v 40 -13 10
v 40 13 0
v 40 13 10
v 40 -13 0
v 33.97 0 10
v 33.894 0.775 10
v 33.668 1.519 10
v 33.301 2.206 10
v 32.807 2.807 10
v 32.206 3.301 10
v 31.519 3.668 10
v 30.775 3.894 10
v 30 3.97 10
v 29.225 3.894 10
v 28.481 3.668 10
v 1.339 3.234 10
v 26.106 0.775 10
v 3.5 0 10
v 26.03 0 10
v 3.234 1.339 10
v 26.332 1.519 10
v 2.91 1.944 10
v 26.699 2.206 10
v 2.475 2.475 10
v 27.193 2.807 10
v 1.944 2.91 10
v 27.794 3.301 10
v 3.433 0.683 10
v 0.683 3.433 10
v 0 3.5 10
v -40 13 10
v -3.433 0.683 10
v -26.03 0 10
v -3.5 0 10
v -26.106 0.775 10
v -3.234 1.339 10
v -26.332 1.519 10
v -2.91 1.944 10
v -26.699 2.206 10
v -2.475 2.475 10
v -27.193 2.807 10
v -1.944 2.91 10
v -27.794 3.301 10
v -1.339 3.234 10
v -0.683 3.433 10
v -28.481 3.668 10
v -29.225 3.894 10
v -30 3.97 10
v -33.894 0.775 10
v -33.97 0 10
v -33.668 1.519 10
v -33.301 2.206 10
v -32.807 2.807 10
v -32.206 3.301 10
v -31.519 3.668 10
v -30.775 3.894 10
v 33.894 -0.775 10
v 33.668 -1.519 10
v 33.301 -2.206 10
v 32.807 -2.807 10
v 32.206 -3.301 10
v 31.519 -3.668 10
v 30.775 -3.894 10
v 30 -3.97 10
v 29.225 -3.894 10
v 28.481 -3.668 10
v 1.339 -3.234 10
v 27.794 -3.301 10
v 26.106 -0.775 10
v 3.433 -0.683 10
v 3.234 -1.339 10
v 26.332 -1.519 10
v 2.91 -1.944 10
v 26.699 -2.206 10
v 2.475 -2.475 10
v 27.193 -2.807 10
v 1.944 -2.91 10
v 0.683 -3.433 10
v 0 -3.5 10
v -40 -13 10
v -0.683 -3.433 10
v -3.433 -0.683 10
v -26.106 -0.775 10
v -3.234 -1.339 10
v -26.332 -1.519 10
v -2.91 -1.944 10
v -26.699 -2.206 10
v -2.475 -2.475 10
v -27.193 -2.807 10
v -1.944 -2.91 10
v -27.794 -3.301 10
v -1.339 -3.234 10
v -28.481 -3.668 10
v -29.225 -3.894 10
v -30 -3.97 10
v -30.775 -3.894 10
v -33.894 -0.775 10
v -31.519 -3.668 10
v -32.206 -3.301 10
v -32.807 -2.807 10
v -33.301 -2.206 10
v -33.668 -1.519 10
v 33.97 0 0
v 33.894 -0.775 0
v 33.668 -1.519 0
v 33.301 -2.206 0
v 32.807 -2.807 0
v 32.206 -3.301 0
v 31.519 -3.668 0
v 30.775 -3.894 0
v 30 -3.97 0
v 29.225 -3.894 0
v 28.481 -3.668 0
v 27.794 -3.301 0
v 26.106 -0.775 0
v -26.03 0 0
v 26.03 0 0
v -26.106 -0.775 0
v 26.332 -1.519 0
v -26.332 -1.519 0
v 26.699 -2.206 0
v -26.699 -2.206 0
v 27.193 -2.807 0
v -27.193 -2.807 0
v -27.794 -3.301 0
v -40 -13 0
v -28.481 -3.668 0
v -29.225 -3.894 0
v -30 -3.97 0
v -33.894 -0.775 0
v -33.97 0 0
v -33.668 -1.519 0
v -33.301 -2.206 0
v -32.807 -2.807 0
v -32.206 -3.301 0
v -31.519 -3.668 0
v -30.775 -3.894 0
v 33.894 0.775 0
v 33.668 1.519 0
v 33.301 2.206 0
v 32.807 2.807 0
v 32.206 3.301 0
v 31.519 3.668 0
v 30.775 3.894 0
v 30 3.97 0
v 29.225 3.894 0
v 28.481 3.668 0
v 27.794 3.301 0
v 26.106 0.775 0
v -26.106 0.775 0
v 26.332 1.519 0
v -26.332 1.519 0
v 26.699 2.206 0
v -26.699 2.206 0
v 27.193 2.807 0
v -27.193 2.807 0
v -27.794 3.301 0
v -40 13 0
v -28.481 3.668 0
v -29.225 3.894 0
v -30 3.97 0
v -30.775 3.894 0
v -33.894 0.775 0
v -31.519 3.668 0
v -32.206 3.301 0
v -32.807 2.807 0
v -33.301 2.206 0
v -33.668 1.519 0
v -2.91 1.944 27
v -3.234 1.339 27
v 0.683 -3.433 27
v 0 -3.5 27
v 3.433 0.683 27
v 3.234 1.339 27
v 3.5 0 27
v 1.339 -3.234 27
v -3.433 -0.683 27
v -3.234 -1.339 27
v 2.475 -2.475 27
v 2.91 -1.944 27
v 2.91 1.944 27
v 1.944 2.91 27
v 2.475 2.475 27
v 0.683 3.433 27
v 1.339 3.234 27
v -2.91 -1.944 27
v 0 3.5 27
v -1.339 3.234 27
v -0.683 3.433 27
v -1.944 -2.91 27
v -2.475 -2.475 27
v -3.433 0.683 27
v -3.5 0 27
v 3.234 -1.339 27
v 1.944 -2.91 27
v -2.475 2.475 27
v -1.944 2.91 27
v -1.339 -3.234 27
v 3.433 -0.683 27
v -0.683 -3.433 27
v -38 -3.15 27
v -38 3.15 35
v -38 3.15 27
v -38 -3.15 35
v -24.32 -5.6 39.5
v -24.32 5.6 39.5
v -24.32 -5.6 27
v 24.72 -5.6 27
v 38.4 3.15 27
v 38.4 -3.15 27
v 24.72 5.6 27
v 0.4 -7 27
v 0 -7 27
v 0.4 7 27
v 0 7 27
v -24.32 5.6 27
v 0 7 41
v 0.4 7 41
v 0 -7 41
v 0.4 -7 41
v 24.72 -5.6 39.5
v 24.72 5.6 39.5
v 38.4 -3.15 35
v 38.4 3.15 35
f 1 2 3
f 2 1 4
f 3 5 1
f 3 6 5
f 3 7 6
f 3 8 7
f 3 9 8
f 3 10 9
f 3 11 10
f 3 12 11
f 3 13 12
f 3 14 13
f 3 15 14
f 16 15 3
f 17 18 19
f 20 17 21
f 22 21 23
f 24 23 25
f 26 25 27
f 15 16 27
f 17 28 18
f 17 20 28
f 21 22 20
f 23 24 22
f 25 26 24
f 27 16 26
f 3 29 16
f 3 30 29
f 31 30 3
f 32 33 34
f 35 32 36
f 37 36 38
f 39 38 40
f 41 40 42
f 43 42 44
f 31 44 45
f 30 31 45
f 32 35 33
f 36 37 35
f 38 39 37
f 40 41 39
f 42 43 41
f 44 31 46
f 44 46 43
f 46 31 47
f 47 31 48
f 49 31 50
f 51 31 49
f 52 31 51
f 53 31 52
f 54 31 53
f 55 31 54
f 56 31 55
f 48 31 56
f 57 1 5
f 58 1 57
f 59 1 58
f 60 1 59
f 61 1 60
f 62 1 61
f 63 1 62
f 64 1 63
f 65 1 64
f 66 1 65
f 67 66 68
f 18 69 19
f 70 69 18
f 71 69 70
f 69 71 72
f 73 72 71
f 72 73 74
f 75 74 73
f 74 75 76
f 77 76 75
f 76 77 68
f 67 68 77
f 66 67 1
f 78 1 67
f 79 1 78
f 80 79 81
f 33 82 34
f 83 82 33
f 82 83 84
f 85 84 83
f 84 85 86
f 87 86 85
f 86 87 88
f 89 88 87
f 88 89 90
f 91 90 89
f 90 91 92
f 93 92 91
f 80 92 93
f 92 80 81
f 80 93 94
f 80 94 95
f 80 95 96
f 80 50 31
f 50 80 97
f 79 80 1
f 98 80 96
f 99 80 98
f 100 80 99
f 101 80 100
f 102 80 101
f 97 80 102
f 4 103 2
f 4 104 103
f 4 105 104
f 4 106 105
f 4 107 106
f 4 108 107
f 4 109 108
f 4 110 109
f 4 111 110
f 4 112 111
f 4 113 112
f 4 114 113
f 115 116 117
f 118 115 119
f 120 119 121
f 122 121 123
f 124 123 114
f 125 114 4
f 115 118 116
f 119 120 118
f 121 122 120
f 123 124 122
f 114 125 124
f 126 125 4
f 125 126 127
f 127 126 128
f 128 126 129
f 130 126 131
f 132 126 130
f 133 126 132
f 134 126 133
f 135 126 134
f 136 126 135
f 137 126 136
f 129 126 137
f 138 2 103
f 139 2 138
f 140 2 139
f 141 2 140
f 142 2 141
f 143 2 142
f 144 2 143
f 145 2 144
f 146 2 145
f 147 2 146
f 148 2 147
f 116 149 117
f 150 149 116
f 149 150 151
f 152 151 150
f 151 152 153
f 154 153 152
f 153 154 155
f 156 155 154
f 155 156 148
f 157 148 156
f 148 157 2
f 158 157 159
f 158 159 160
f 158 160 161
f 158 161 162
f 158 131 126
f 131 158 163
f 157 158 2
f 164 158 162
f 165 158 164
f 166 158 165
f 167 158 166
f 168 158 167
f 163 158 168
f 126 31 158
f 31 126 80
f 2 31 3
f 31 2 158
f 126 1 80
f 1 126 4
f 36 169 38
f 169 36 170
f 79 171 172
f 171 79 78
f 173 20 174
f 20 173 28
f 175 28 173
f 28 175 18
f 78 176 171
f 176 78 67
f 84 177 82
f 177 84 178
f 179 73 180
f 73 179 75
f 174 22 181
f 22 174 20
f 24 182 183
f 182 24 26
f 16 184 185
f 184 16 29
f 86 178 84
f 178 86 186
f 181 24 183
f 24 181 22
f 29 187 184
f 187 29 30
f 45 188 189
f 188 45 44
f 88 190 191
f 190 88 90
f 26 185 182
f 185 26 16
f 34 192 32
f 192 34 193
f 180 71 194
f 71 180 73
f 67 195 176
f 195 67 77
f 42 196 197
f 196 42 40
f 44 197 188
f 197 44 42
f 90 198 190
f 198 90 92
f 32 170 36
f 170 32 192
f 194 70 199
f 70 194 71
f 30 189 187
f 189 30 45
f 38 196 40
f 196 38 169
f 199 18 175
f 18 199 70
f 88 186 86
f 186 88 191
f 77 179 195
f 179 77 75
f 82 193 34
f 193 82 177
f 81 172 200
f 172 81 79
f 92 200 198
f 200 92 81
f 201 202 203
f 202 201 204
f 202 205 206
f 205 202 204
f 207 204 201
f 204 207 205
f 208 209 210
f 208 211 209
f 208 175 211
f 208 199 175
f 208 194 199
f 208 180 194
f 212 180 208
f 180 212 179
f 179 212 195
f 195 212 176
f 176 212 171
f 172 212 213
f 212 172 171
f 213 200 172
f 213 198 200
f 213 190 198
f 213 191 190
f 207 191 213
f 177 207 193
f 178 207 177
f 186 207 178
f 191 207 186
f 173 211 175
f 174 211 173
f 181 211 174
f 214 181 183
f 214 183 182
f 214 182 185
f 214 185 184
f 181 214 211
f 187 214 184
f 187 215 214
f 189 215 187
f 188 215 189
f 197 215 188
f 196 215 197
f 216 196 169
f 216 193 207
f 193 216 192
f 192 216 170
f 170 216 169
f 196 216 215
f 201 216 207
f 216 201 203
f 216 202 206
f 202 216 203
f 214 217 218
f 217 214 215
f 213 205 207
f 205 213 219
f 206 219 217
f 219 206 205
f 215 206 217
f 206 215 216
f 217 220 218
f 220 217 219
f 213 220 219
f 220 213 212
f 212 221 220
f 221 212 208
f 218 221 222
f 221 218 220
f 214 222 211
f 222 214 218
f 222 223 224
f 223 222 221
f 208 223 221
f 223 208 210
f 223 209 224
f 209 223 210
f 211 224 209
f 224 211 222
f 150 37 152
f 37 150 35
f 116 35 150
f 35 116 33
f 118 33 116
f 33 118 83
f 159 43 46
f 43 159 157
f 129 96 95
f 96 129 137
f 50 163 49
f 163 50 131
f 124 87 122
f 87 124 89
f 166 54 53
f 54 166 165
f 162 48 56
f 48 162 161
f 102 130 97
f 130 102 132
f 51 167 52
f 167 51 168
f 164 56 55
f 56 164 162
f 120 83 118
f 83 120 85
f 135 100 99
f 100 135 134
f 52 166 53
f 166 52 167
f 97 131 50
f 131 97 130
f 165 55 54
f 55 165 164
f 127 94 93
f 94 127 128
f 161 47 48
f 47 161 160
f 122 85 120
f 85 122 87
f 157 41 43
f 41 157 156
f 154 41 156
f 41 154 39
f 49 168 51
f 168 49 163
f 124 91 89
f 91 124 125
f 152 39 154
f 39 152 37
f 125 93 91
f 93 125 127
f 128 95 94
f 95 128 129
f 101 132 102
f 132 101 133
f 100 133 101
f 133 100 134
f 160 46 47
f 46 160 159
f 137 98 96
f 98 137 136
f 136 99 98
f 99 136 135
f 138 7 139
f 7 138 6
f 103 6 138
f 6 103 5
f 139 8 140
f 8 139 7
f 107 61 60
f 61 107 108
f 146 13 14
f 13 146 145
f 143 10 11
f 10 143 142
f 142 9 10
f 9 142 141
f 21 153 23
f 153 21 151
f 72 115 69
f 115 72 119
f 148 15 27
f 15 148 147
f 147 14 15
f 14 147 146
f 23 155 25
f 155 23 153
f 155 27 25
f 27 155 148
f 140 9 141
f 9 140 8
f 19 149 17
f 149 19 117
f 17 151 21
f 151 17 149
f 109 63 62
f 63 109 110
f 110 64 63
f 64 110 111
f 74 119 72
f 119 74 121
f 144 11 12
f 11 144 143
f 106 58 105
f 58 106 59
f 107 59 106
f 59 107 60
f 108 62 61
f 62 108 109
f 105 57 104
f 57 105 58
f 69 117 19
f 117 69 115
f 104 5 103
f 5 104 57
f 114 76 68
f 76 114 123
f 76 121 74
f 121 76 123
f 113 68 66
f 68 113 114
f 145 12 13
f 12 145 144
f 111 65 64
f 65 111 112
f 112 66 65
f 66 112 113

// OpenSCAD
$fn = 32;

// ----------------------------------------------------------------------
// Boat cleat: 80 mm base, horn 34 mm up
// ----------------------------------------------------------------------

// --- parameters (mm) ---
base_l = 80;              // base length
base_w = 26;              // base width
base_t = 10;              // base thickness
horn_len = 76;            // horn length
horn_d = 14;              // horn diameter at the middle
horn_z = 34;              // horn axis height
end_drop = 6;             // how far the horn tips drop
post_d = 7;               // centre post diameter
holes_d = 7.94;           // fixing holes
hole_x = 30;              // fixing hole spacing

difference() {
  union() {
    translate([-40, -13, 0]) cube([base_l, base_w, base_t]);
    /* centre post, sunk 1 mm into the base */
    translate([0, 0, 9]) cylinder(h = 25, d = post_d);
    /* horn: a hull chain of boxes, full in the middle and lighter at the tips */
    hull() {
      translate([-38, -3.15, 27]) cube([0.4, 6.3, 8], center = false);
      translate([-24.32, -5.6, 27]) cube([0.4, 11.2, 12.5], center = false);
    }
    hull() {
      translate([-24.32, -5.6, 27]) cube([0.4, 11.2, 12.5], center = false);
      translate([0, -7, 27]) cube([0.4, 14, 14], center = false);
    }
    hull() {
      translate([0, -7, 27]) cube([0.4, 14, 14], center = false);
      translate([24.32, -5.6, 27]) cube([0.4, 11.2, 12.5], center = false);
    }
    hull() {
      translate([24.32, -5.6, 27]) cube([0.4, 11.2, 12.5], center = false);
      translate([38, -3.15, 27]) cube([0.4, 6.3, 8], center = false);
    }
  }
  translate([-30, 0, -2.5]) cylinder(h = base_t + 5, d = holes_d);
  translate([30, 0, -2.5]) cylinder(h = base_t + 5, d = holes_d);
}
